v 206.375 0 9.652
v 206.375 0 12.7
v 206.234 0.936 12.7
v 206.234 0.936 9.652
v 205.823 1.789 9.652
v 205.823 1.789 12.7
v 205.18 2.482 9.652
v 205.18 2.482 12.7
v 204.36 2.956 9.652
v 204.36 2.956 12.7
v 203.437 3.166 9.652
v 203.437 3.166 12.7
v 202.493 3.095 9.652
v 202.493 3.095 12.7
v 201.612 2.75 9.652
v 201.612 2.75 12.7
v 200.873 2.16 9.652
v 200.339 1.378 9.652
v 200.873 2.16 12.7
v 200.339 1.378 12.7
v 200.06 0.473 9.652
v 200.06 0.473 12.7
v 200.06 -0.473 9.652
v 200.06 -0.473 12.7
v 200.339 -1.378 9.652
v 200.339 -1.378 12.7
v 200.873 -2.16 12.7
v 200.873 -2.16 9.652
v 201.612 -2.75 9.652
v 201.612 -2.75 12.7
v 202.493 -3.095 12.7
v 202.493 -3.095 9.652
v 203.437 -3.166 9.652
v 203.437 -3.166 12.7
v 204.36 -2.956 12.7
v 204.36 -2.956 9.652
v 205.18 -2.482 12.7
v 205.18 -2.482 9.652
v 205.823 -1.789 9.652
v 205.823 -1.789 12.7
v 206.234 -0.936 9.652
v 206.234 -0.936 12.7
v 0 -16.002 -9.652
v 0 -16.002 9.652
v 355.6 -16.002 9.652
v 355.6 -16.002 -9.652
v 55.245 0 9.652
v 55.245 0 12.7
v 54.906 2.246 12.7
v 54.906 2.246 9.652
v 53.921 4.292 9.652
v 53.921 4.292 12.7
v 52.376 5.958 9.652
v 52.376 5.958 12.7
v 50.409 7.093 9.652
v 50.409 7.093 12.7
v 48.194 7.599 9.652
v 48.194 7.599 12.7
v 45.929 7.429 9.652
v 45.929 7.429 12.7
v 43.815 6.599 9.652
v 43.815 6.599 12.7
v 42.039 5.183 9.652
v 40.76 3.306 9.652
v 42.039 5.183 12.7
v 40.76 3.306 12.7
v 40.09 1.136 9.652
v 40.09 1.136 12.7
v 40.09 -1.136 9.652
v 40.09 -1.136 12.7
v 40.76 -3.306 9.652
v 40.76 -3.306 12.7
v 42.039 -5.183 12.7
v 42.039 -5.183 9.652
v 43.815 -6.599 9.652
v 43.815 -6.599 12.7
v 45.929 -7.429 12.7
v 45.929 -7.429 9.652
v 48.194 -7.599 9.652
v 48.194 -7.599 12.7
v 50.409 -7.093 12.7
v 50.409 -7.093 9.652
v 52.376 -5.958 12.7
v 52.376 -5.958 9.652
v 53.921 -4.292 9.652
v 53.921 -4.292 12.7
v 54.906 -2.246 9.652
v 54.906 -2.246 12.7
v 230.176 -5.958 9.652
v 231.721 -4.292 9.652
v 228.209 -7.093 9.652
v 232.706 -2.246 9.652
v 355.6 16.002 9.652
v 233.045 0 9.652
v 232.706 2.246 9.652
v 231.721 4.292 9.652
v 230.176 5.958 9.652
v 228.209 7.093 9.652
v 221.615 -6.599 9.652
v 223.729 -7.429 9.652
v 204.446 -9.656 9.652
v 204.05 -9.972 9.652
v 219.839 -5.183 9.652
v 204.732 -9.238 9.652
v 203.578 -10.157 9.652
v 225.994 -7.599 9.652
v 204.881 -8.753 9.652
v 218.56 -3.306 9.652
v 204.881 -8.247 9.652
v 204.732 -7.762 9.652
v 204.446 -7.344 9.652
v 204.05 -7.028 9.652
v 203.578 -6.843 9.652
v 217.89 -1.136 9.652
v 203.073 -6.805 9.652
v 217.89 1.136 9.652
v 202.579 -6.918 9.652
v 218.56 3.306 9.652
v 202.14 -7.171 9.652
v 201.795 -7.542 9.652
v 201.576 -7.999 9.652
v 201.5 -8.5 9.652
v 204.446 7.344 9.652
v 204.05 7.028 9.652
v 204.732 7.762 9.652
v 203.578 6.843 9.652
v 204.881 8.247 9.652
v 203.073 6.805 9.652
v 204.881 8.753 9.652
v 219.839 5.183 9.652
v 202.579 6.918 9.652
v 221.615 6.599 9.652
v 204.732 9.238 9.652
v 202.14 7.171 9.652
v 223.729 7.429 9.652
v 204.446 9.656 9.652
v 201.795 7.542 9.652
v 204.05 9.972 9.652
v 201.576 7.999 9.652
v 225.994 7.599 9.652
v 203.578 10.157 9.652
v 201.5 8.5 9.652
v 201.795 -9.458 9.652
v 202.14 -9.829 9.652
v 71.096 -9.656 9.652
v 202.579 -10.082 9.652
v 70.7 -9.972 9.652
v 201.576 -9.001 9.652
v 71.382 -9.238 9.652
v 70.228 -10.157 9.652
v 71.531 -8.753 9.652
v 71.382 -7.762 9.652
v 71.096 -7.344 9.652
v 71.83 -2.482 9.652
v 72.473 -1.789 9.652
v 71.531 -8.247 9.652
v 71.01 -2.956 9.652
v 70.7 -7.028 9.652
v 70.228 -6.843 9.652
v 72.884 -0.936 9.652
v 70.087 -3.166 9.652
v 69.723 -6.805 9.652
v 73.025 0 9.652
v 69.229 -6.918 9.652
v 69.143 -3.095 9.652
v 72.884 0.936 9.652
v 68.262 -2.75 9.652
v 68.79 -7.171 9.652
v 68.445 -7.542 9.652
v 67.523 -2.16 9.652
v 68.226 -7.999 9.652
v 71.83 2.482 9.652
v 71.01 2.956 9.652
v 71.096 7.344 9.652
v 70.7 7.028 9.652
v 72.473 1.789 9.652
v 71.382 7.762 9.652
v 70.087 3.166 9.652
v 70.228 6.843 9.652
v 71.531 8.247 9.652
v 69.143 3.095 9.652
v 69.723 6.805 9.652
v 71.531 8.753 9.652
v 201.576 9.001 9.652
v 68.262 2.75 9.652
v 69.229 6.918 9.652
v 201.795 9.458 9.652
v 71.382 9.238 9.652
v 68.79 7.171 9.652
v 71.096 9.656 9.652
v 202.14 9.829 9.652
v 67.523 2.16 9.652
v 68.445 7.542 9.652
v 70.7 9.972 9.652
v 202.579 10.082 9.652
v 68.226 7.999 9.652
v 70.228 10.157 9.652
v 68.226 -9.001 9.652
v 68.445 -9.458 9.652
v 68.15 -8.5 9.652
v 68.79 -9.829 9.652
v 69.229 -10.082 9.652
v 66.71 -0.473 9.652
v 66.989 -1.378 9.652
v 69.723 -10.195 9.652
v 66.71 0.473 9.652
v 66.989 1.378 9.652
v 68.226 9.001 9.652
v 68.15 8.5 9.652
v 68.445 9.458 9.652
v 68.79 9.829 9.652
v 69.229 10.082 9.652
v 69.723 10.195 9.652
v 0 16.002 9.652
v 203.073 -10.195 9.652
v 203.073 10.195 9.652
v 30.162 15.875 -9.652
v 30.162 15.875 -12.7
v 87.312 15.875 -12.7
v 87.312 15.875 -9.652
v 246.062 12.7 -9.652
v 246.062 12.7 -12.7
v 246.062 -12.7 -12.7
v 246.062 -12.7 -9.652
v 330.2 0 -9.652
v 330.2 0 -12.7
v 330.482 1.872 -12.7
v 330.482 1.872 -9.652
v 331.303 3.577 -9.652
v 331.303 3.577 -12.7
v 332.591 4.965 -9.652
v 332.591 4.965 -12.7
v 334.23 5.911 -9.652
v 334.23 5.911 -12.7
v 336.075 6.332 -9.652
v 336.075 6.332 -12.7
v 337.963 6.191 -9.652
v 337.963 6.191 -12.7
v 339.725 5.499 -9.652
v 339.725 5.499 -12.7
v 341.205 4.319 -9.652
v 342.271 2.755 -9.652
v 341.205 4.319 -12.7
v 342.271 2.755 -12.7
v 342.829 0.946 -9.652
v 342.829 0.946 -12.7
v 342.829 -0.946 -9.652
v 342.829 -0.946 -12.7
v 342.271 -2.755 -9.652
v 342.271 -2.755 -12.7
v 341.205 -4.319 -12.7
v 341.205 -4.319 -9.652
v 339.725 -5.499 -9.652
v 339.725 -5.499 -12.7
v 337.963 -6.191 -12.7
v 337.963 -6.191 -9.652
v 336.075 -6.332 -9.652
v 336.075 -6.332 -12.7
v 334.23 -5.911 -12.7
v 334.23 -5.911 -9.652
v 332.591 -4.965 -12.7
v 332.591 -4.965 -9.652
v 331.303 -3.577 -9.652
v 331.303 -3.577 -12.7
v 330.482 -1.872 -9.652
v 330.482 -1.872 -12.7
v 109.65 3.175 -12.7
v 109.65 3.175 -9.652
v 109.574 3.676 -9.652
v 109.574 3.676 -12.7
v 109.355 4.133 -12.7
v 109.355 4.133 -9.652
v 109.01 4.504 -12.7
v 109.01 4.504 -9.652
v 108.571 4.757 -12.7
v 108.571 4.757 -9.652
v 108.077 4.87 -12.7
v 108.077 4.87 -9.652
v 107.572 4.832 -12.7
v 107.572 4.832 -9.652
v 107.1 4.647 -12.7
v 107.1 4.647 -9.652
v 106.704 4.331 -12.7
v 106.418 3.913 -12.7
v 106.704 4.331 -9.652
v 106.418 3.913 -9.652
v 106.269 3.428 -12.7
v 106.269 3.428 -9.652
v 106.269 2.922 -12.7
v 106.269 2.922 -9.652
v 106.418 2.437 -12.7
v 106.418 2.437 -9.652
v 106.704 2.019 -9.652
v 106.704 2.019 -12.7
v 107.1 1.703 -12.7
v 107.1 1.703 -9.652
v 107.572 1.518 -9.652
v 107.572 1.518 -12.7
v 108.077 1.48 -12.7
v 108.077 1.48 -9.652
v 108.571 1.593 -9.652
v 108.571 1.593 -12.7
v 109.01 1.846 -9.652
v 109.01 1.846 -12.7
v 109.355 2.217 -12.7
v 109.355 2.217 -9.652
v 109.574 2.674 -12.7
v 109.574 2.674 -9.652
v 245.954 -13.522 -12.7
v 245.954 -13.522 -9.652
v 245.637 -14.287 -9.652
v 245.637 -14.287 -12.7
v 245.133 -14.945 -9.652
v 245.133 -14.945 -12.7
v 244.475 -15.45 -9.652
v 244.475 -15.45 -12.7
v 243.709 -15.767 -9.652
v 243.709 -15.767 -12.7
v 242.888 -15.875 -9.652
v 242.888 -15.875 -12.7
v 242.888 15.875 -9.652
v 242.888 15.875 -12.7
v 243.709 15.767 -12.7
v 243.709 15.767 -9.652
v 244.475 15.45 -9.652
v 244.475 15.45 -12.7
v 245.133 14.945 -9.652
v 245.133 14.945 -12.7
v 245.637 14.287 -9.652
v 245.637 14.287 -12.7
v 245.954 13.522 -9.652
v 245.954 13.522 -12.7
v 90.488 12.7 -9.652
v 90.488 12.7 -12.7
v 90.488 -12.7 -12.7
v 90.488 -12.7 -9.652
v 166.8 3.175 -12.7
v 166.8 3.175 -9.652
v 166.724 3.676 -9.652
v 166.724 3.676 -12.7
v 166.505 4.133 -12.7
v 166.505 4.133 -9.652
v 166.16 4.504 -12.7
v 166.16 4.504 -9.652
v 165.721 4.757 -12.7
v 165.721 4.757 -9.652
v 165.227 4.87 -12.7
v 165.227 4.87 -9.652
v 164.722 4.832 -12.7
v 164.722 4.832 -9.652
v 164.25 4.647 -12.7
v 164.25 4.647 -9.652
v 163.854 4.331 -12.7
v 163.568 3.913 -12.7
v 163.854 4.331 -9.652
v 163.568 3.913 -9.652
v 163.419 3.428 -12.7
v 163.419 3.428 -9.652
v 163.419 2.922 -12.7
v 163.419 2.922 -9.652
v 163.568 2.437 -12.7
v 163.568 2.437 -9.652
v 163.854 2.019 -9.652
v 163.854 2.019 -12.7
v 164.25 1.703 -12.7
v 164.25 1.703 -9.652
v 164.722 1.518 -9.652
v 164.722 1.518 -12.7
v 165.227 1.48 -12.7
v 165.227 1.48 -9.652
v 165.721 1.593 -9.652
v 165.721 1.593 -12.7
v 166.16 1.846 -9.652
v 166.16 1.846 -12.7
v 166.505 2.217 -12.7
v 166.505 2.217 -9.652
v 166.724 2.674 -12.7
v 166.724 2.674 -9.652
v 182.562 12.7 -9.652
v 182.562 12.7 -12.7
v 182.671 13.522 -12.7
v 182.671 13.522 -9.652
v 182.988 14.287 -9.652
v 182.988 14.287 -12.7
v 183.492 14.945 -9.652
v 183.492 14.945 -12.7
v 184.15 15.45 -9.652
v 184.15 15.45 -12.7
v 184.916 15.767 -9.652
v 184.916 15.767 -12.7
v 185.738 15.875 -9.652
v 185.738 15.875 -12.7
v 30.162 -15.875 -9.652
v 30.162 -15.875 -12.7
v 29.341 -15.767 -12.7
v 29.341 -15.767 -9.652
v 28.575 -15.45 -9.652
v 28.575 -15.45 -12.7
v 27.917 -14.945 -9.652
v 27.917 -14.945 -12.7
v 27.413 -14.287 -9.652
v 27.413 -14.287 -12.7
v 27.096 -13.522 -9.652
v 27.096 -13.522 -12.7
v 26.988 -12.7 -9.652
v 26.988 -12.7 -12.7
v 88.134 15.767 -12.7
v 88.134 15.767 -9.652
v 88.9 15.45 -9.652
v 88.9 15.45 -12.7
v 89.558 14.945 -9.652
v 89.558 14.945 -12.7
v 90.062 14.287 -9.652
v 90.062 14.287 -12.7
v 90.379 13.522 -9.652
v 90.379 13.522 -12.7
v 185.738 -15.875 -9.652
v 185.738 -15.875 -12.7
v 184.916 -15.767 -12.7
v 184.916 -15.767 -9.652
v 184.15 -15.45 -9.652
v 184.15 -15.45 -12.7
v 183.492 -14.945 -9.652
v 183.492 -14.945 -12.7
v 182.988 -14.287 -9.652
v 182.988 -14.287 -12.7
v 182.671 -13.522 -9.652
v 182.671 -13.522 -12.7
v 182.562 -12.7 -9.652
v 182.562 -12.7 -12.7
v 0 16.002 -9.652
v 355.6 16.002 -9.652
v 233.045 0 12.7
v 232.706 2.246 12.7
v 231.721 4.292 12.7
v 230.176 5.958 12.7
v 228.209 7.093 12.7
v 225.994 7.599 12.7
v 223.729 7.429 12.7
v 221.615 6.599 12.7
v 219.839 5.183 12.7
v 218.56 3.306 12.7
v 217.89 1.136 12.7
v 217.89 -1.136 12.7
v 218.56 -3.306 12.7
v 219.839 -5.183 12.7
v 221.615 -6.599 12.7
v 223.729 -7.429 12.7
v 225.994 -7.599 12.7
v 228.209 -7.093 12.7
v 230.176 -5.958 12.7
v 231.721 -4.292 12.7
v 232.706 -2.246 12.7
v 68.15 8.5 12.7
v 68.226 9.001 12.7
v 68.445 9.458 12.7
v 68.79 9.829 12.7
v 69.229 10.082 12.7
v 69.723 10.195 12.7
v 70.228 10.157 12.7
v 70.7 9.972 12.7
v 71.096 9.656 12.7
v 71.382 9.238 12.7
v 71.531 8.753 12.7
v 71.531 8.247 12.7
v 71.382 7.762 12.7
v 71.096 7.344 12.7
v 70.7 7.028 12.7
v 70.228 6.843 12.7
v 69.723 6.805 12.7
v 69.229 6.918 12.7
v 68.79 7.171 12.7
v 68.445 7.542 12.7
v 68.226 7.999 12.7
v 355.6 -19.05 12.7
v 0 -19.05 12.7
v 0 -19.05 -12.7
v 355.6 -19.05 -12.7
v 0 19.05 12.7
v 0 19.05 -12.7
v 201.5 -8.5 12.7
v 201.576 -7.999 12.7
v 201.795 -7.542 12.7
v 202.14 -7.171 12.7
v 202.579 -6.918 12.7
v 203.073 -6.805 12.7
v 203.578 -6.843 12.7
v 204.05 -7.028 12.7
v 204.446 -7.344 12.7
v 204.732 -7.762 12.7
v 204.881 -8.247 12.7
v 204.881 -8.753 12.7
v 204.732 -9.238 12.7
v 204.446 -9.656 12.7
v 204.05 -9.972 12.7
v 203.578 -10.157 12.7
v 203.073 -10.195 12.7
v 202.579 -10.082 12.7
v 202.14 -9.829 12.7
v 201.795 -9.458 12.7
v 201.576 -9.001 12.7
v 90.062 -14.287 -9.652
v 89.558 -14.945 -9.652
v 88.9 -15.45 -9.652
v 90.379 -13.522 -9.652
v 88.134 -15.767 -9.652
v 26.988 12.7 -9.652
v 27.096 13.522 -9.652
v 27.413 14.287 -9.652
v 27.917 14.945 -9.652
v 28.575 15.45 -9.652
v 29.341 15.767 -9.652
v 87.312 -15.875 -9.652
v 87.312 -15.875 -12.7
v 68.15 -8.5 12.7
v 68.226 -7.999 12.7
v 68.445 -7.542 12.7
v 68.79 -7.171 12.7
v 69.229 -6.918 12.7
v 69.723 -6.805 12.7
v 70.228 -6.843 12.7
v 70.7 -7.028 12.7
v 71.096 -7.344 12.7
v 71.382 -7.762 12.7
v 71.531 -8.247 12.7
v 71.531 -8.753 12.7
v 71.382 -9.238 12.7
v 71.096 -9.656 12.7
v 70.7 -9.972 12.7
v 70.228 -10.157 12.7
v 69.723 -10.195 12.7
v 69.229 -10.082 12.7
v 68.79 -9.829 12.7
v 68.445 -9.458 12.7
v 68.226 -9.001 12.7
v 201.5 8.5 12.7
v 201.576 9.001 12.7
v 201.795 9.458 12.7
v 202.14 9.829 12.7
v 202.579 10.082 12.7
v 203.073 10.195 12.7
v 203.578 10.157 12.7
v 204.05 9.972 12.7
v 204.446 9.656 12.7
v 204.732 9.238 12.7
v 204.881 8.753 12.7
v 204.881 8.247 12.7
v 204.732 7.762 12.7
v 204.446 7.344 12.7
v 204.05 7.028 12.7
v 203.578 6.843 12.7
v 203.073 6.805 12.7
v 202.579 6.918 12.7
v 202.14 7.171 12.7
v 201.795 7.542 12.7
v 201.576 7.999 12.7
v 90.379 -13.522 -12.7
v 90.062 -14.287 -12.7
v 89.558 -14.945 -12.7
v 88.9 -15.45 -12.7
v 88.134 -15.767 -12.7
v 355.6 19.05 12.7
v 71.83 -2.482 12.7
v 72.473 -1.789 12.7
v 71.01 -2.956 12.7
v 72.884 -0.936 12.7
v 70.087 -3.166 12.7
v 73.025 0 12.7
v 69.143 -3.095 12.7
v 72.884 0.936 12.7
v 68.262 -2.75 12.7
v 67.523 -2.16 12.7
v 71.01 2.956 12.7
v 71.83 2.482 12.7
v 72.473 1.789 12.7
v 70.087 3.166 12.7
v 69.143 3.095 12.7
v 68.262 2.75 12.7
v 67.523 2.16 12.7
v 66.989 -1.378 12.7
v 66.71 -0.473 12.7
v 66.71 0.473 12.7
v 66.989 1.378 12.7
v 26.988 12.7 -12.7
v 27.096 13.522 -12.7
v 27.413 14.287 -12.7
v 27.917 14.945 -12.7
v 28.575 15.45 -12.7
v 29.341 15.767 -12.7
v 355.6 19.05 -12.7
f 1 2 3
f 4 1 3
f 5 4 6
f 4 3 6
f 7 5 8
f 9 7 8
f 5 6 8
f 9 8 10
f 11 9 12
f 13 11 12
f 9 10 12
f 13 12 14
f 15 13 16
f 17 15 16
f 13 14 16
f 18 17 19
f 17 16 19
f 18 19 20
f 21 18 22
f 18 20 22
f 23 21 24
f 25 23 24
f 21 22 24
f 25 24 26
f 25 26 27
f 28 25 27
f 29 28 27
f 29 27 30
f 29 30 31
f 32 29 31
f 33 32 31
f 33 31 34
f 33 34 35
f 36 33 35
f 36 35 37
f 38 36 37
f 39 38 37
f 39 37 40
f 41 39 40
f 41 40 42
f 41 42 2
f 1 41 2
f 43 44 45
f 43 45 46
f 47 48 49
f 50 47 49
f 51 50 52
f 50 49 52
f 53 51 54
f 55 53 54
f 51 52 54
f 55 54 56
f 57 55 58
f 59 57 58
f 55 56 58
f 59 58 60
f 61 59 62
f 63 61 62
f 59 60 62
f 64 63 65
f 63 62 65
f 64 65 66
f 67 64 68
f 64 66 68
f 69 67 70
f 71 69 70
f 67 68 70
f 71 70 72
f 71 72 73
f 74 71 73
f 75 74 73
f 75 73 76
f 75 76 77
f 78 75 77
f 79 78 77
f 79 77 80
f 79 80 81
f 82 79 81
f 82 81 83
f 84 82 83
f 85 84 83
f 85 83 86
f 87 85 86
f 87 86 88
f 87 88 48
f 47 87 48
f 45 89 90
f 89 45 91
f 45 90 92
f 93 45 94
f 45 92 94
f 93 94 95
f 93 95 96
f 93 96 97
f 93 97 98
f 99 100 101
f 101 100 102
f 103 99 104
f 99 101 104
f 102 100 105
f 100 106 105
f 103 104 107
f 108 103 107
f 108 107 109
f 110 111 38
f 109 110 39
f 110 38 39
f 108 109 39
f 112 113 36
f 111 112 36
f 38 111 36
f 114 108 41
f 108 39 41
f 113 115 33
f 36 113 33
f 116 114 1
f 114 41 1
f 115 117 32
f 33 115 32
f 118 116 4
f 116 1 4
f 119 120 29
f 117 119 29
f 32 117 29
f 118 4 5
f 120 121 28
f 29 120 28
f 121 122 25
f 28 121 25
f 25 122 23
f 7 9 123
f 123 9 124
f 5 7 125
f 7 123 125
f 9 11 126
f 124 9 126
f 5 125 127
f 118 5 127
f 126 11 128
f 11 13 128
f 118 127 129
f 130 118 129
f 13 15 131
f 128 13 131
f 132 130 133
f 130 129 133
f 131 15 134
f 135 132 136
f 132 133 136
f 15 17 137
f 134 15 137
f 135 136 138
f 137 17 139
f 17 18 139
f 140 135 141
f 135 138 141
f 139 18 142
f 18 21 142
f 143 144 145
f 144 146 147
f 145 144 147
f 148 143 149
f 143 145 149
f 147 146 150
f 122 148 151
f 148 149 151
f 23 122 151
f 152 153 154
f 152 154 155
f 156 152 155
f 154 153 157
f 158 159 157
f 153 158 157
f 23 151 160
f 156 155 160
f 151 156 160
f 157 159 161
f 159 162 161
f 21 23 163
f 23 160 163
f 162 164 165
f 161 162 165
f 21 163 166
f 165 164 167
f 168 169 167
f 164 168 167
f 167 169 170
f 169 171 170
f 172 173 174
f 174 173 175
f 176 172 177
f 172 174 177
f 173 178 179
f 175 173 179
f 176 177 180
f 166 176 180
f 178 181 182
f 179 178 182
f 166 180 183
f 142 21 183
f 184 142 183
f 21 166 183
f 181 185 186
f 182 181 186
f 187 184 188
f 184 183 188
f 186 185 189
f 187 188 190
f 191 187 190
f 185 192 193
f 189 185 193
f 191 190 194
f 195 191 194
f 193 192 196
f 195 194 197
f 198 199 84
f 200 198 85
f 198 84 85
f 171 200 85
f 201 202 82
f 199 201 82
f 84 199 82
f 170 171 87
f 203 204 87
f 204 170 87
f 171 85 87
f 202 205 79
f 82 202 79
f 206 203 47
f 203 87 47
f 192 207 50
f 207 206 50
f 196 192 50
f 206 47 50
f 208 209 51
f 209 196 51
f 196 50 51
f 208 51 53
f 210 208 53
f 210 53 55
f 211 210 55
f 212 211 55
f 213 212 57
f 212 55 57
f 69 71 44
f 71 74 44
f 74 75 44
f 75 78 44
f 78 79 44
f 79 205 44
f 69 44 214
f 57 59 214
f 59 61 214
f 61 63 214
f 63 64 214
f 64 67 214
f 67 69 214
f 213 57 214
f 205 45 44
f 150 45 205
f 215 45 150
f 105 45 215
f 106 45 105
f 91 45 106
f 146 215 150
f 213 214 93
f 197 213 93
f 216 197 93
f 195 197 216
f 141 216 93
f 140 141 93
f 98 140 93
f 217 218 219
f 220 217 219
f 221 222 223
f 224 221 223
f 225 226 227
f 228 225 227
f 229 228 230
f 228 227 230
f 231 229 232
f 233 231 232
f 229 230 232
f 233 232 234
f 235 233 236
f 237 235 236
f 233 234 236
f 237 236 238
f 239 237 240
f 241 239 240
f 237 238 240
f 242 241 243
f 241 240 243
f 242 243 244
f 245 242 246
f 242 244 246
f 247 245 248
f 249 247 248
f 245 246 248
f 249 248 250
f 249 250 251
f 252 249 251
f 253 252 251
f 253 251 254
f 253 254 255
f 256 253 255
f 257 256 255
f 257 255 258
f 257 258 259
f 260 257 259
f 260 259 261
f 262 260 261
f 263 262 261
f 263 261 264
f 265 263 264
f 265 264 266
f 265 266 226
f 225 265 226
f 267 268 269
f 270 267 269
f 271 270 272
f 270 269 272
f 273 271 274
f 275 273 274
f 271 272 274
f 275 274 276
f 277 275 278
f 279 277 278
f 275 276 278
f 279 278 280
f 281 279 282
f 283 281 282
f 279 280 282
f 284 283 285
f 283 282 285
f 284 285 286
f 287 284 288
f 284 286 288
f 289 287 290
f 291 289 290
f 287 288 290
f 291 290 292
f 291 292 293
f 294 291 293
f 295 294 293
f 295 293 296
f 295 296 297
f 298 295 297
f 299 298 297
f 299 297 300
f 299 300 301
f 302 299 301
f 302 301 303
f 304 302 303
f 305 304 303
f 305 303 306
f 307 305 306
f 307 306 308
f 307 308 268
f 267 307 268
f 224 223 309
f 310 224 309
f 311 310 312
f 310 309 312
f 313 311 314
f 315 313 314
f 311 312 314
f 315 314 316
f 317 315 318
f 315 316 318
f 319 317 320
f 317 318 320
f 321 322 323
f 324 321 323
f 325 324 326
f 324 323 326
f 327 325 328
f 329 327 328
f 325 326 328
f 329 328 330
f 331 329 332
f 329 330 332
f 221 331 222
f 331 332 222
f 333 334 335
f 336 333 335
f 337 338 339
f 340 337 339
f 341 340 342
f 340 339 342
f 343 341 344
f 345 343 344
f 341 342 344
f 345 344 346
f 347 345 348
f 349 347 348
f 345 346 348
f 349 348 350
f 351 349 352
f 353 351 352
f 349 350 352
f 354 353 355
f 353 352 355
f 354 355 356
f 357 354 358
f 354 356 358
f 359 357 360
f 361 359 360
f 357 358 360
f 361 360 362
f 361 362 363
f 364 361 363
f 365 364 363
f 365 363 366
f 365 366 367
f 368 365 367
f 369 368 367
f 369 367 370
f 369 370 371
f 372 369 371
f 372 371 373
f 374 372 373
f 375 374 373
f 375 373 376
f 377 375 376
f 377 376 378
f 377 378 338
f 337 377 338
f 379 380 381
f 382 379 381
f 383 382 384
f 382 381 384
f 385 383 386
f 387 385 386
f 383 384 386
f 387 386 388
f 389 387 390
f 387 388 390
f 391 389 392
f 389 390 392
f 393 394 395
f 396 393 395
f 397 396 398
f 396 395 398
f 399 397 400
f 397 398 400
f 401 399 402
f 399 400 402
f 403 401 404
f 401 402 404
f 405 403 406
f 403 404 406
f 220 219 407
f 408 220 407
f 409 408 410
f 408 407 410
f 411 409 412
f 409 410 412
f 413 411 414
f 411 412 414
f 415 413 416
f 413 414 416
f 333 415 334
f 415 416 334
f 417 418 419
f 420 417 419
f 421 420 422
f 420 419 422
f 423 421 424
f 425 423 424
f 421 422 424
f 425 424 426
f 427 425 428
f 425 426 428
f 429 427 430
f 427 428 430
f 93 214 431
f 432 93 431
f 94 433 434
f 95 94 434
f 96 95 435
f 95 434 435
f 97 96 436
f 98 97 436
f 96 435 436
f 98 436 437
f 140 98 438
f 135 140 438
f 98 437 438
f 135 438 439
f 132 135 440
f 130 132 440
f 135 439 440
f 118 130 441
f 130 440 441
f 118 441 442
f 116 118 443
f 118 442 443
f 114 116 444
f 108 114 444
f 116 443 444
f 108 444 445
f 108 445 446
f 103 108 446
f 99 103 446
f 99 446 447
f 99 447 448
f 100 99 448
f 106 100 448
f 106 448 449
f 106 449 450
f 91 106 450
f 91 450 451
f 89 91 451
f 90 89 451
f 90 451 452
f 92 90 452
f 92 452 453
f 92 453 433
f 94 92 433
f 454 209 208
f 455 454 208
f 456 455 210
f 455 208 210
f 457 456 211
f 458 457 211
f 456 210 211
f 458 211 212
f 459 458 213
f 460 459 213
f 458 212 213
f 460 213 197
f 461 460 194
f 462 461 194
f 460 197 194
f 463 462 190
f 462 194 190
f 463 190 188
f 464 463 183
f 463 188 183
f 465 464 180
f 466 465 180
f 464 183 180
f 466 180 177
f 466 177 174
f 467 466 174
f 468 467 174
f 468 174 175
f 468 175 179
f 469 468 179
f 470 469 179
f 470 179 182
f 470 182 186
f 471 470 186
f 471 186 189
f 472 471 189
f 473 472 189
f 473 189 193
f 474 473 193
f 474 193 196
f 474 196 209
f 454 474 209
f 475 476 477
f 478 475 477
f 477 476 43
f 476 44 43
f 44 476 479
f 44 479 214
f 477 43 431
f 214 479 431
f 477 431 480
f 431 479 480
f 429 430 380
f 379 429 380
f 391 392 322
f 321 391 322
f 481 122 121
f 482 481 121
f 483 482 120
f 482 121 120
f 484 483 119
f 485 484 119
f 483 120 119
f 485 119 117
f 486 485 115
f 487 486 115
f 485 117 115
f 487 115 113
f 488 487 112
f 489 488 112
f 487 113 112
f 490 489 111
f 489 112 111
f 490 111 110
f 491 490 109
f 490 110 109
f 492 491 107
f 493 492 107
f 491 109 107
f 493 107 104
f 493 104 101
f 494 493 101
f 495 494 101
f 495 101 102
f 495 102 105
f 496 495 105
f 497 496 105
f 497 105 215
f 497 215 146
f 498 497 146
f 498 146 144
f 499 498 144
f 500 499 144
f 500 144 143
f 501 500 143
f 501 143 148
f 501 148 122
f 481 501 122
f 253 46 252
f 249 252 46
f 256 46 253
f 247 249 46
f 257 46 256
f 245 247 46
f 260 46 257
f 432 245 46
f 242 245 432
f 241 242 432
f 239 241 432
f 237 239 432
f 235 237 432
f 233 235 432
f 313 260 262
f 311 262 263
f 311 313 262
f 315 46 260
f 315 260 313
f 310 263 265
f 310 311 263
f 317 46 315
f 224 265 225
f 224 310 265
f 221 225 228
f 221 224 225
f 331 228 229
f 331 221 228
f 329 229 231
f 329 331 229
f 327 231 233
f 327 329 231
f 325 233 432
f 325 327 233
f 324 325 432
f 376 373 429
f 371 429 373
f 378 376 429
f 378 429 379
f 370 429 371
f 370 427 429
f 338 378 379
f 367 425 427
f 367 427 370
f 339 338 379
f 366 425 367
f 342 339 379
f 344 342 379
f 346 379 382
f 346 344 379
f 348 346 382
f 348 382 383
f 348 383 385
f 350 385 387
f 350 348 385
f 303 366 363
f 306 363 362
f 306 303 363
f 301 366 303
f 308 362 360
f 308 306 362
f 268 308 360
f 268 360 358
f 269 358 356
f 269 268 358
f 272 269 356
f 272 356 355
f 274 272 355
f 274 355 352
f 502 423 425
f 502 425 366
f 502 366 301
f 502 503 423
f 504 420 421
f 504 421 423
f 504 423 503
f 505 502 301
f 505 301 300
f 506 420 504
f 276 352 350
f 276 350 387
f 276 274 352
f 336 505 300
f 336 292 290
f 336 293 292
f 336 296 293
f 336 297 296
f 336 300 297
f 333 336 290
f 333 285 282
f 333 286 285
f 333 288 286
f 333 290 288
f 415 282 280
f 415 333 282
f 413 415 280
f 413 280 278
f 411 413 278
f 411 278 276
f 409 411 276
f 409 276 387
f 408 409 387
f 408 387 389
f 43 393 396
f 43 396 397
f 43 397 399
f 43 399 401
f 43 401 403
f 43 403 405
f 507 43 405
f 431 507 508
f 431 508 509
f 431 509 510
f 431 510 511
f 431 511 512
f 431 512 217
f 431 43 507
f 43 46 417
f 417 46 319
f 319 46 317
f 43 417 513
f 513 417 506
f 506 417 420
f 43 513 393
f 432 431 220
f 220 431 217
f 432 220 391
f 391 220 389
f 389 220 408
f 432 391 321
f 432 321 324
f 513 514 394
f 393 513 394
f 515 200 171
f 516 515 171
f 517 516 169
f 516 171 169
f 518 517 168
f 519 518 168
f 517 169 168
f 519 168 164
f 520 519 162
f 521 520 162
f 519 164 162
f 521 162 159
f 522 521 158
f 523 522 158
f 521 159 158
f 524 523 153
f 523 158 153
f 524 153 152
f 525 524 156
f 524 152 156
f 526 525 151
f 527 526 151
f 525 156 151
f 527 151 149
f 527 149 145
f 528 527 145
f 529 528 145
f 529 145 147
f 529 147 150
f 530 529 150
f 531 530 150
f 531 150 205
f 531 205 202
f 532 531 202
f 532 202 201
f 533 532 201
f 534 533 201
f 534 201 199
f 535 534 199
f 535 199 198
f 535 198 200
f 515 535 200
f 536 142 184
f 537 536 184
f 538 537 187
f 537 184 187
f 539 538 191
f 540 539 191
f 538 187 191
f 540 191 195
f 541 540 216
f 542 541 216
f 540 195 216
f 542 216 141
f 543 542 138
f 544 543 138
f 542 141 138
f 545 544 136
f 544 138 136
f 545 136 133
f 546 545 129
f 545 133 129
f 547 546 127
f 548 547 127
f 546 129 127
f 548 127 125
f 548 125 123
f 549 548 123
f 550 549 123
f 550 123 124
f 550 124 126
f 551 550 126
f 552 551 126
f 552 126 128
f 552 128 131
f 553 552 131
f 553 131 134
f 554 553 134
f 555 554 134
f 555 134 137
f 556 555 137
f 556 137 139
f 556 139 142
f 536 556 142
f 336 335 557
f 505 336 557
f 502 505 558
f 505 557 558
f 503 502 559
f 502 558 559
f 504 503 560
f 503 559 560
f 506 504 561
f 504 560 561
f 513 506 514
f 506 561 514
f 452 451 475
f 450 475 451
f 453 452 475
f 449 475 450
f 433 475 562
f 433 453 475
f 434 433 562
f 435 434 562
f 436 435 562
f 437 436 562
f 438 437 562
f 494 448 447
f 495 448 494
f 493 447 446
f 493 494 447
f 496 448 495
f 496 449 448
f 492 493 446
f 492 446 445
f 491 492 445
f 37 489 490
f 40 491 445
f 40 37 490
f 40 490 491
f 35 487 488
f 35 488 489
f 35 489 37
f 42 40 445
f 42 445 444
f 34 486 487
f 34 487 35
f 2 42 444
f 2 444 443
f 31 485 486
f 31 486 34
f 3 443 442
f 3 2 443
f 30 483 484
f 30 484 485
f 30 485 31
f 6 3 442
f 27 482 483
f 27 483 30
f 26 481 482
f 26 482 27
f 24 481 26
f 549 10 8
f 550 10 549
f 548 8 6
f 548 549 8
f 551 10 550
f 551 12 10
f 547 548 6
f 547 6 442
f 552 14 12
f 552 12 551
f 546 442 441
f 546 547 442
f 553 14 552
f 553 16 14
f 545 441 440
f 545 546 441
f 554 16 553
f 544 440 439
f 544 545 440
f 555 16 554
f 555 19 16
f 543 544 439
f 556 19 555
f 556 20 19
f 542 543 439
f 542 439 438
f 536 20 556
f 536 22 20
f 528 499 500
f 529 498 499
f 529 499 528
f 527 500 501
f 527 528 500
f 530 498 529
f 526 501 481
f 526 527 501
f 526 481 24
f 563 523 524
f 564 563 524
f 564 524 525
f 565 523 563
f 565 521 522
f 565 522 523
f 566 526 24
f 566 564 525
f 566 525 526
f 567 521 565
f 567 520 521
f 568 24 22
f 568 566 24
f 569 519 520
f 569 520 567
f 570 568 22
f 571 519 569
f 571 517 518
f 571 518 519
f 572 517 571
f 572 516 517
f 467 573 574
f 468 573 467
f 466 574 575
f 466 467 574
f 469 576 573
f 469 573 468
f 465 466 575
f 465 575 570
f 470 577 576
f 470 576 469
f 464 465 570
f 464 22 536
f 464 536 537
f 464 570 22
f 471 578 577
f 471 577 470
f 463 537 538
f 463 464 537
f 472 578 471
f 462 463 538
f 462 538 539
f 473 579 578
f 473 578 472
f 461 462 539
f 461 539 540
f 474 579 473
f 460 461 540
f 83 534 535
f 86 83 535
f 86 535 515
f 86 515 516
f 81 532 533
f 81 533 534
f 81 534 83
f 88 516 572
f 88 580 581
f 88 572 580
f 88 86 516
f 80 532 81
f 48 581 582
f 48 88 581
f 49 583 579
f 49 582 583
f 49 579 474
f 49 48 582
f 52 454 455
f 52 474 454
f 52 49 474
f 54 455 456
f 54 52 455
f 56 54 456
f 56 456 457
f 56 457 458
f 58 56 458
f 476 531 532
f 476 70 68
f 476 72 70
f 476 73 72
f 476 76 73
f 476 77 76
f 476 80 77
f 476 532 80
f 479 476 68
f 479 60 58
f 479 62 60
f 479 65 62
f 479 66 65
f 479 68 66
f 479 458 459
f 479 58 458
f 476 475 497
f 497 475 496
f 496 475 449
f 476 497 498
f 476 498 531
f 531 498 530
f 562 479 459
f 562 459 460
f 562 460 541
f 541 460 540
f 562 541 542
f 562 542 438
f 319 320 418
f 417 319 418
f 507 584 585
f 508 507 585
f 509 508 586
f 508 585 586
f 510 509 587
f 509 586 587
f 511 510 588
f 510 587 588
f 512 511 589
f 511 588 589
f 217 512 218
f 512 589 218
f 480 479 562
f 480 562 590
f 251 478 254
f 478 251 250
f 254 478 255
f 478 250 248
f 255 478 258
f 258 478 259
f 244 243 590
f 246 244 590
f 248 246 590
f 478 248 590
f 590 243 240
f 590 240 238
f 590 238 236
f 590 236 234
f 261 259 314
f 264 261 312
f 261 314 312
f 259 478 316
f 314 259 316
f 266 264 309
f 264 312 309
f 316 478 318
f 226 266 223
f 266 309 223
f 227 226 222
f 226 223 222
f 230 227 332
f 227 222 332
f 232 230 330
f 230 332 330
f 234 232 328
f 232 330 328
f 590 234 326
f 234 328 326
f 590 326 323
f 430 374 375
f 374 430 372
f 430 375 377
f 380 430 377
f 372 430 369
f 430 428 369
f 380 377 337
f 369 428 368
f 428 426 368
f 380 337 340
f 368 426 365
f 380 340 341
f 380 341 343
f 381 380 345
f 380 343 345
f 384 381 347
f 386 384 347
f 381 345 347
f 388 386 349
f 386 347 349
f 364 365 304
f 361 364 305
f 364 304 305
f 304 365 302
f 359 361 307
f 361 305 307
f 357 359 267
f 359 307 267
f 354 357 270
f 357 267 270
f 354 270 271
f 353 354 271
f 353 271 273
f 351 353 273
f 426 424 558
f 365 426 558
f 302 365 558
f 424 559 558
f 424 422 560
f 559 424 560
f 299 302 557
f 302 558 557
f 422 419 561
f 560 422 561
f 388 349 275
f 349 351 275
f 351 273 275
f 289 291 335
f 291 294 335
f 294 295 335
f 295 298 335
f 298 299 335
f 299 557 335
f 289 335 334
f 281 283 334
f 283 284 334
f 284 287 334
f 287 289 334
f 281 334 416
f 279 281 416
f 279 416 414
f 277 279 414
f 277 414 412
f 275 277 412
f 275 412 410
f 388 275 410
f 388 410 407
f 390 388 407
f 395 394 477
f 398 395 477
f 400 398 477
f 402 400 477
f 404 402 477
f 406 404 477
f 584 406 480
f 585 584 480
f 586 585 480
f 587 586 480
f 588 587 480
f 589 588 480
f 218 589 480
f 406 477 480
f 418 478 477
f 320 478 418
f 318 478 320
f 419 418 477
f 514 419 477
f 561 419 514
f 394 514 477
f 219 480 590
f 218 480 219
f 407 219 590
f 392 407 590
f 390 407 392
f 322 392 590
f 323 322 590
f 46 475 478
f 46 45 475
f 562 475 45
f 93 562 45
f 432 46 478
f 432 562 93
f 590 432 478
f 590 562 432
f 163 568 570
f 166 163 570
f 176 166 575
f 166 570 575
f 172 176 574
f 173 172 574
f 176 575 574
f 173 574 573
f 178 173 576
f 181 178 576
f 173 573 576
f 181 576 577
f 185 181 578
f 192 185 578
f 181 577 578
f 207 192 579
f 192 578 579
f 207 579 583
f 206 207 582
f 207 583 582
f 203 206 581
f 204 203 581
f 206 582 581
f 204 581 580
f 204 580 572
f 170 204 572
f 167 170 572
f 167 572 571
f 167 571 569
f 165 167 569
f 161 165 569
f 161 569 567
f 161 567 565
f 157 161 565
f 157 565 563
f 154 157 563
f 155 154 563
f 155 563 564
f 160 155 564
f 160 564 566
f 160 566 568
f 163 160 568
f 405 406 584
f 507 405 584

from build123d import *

# Parameters (mm, degrees)
SKETCH1_W                = 25.4
SKETCH1_H                = 38.1
SKETCH1_W_2              = 19.304
SKETCH1_H_2              = 32.004
BOSS_EXTRUDE1_DEPTH      = 355.6
CUT_EXTRUDE1_REACH       = 27.4
SKETCH2_R                = 6.35
CUT_EXTRUDE4_REACH       = 27.4
SKETCH5_R                = 7.62
CUT_EXTRUDE5_REACH       = 27.4
SKETCH6_R                = 3.175
CUT_EXTRUDE6_REACH       = 27.4
M3_CLEARANCE_HOLE1_D     = 3.4
M3_CLEARANCE_HOLE1_DEPTH = 3.048
M3_CLEARANCE_HOLE2_D     = 3.4
M3_CLEARANCE_HOLE2_DEPTH = 3.048


with BuildPart() as part:
    # Sketch1 → Boss-Extrude1 (new body)
    with BuildSketch(Plane(origin=(0, 0, 0), x_dir=(0, 0, -1), z_dir=(1, 0, 0))):
        Rectangle(SKETCH1_W, SKETCH1_H)
        Rectangle(SKETCH1_W_2, SKETCH1_H_2, mode=Mode.SUBTRACT)
    extrude(amount=BOSS_EXTRUDE1_DEPTH)

    # Sketch2 → Cut-Extrude1 (cut, up to next)
    with BuildSketch(Plane(origin=(0, 0, -12.7), x_dir=(-1, 0, 0), z_dir=(0, 0, -1)), mode=Mode.PRIVATE) as cut_extrude1_sk1:
        with Locations((-336.55, 0)):
            Circle(SKETCH2_R)
    cut_extrude1_tool1 = extrude(cut_extrude1_sk1.sketch, amount=-CUT_EXTRUDE1_REACH, mode=Mode.PRIVATE) & part.part
    add(cut_extrude1_tool1.solids().sort_by_distance((336.55, 0, -12.7))[0], mode=Mode.SUBTRACT)

    # Sketch5 → Cut-Extrude4 (cut, up to next)
    with BuildSketch(Plane.XY.offset(12.7), mode=Mode.PRIVATE) as cut_extrude4_sk1:
        with Locations((47.625, 0)):
            Circle(SKETCH5_R)
    cut_extrude4_tool1 = extrude(cut_extrude4_sk1.sketch, amount=-CUT_EXTRUDE4_REACH, mode=Mode.PRIVATE) & part.part
    add(cut_extrude4_tool1.solids().sort_by_distance((47.625, 0, 12.7))[0], mode=Mode.SUBTRACT)
    # Sketch5 → Cut-Extrude4 (cut, up to next)
    with BuildSketch(Plane.XY.offset(12.7), mode=Mode.PRIVATE) as cut_extrude4_sk2:
        with Locations((225.425, 0)):
            Circle(SKETCH5_R)
    cut_extrude4_tool2 = extrude(cut_extrude4_sk2.sketch, amount=-CUT_EXTRUDE4_REACH, mode=Mode.PRIVATE) & part.part
    add(cut_extrude4_tool2.solids().sort_by_distance((225.425, 0, 12.7))[0], mode=Mode.SUBTRACT)

    # Sketch6 → Cut-Extrude5 (cut, up to next)
    with BuildSketch(Plane.XY.offset(12.7), mode=Mode.PRIVATE) as cut_extrude5_sk1:
        with Locations((69.85, 0)):
            Circle(SKETCH6_R)
    cut_extrude5_tool1 = extrude(cut_extrude5_sk1.sketch, amount=-CUT_EXTRUDE5_REACH, mode=Mode.PRIVATE) & part.part
    add(cut_extrude5_tool1.solids().sort_by_distance((69.85, 0, 12.7))[0], mode=Mode.SUBTRACT)
    # Sketch6 → Cut-Extrude5 (cut, up to next)
    with BuildSketch(Plane.XY.offset(12.7), mode=Mode.PRIVATE) as cut_extrude5_sk2:
        with Locations((203.2, 0)):
            Circle(SKETCH6_R)
    cut_extrude5_tool2 = extrude(cut_extrude5_sk2.sketch, amount=-CUT_EXTRUDE5_REACH, mode=Mode.PRIVATE) & part.part
    add(cut_extrude5_tool2.solids().sort_by_distance((203.2, 0, 12.7))[0], mode=Mode.SUBTRACT)

    # Sketch7 → Cut-Extrude6 (cut, up to next)
    with BuildSketch(Plane(origin=(0, 0, -12.7), x_dir=(-1, 0, 0), z_dir=(0, 0, -1)), mode=Mode.PRIVATE) as cut_extrude6_sk1:
        with BuildLine():
            Line((-242.8875, -15.875), (-185.7375, -15.875))
            ThreePointArc((-185.7375, -15.875), (-183.49243597, -14.94506403), (-182.5625, -12.7))
            Line((-182.5625, -12.7), (-182.5625, 12.7))
            ThreePointArc((-182.5625, 12.7), (-183.49243597, 14.94506403), (-185.7375, 15.875))
            Line((-185.7375, 15.875), (-242.8875, 15.875))
            ThreePointArc((-242.8875, 15.875), (-245.13256403, 14.94506403), (-246.0625, 12.7))
            Line((-246.0625, 12.7), (-246.0625, -12.7))
            ThreePointArc((-246.0625, -12.7), (-245.13256403, -14.94506403), (-242.8875, -15.875))
        make_face()
    cut_extrude6_tool1 = extrude(cut_extrude6_sk1.sketch, amount=-CUT_EXTRUDE6_REACH, mode=Mode.PRIVATE) & part.part
    add(cut_extrude6_tool1.solids().sort_by_distance((214.3125, 0, -12.7))[0], mode=Mode.SUBTRACT)
    # Sketch7 → Cut-Extrude6 (cut, up to next)
    with BuildSketch(Plane(origin=(0, 0, -12.7), x_dir=(-1, 0, 0), z_dir=(0, 0, -1)), mode=Mode.PRIVATE) as cut_extrude6_sk2:
        with BuildLine():
            Line((-87.3125, -15.875), (-30.1625, -15.875))
            ThreePointArc((-30.1625, -15.875), (-27.91743597, -14.94506403), (-26.9875, -12.7))
            Line((-26.9875, -12.7), (-26.9875, 12.7))
            ThreePointArc((-26.9875, 12.7), (-27.91743597, 14.94506403), (-30.1625, 15.875))
            Line((-30.1625, 15.875), (-87.3125, 15.875))
            ThreePointArc((-87.3125, 15.875), (-89.55756403, 14.94506403), (-90.4875, 12.7))
            Line((-90.4875, 12.7), (-90.4875, -12.7))
            ThreePointArc((-90.4875, -12.7), (-89.55756403, -14.94506403), (-87.3125, -15.875))
        make_face()
    cut_extrude6_tool2 = extrude(cut_extrude6_sk2.sketch, amount=-CUT_EXTRUDE6_REACH, mode=Mode.PRIVATE) & part.part
    add(cut_extrude6_tool2.solids().sort_by_distance((58.7375, 0, -12.7))[0], mode=Mode.SUBTRACT)

    # M3 Clearance Hole1
    with Locations(Plane(origin=(165.1, 3.175, -12.7), x_dir=(-1, 0, 0), z_dir=(0, 0, -1))):
        with Locations((0, 0), (57.15, 0)):
            Hole(M3_CLEARANCE_HOLE1_D / 2, depth=M3_CLEARANCE_HOLE1_DEPTH)

    # M3 Clearance Hole2
    with Locations(Plane(origin=(69.85, 8.5, 12.7), x_dir=(1, 0, 0), z_dir=(0, 0, 1))):
        with Locations((0, 0), (0, -17), (133.35, 0), (133.35, -17)):
            Hole(M3_CLEARANCE_HOLE2_D / 2, depth=M3_CLEARANCE_HOLE2_DEPTH)


solid = part.part
